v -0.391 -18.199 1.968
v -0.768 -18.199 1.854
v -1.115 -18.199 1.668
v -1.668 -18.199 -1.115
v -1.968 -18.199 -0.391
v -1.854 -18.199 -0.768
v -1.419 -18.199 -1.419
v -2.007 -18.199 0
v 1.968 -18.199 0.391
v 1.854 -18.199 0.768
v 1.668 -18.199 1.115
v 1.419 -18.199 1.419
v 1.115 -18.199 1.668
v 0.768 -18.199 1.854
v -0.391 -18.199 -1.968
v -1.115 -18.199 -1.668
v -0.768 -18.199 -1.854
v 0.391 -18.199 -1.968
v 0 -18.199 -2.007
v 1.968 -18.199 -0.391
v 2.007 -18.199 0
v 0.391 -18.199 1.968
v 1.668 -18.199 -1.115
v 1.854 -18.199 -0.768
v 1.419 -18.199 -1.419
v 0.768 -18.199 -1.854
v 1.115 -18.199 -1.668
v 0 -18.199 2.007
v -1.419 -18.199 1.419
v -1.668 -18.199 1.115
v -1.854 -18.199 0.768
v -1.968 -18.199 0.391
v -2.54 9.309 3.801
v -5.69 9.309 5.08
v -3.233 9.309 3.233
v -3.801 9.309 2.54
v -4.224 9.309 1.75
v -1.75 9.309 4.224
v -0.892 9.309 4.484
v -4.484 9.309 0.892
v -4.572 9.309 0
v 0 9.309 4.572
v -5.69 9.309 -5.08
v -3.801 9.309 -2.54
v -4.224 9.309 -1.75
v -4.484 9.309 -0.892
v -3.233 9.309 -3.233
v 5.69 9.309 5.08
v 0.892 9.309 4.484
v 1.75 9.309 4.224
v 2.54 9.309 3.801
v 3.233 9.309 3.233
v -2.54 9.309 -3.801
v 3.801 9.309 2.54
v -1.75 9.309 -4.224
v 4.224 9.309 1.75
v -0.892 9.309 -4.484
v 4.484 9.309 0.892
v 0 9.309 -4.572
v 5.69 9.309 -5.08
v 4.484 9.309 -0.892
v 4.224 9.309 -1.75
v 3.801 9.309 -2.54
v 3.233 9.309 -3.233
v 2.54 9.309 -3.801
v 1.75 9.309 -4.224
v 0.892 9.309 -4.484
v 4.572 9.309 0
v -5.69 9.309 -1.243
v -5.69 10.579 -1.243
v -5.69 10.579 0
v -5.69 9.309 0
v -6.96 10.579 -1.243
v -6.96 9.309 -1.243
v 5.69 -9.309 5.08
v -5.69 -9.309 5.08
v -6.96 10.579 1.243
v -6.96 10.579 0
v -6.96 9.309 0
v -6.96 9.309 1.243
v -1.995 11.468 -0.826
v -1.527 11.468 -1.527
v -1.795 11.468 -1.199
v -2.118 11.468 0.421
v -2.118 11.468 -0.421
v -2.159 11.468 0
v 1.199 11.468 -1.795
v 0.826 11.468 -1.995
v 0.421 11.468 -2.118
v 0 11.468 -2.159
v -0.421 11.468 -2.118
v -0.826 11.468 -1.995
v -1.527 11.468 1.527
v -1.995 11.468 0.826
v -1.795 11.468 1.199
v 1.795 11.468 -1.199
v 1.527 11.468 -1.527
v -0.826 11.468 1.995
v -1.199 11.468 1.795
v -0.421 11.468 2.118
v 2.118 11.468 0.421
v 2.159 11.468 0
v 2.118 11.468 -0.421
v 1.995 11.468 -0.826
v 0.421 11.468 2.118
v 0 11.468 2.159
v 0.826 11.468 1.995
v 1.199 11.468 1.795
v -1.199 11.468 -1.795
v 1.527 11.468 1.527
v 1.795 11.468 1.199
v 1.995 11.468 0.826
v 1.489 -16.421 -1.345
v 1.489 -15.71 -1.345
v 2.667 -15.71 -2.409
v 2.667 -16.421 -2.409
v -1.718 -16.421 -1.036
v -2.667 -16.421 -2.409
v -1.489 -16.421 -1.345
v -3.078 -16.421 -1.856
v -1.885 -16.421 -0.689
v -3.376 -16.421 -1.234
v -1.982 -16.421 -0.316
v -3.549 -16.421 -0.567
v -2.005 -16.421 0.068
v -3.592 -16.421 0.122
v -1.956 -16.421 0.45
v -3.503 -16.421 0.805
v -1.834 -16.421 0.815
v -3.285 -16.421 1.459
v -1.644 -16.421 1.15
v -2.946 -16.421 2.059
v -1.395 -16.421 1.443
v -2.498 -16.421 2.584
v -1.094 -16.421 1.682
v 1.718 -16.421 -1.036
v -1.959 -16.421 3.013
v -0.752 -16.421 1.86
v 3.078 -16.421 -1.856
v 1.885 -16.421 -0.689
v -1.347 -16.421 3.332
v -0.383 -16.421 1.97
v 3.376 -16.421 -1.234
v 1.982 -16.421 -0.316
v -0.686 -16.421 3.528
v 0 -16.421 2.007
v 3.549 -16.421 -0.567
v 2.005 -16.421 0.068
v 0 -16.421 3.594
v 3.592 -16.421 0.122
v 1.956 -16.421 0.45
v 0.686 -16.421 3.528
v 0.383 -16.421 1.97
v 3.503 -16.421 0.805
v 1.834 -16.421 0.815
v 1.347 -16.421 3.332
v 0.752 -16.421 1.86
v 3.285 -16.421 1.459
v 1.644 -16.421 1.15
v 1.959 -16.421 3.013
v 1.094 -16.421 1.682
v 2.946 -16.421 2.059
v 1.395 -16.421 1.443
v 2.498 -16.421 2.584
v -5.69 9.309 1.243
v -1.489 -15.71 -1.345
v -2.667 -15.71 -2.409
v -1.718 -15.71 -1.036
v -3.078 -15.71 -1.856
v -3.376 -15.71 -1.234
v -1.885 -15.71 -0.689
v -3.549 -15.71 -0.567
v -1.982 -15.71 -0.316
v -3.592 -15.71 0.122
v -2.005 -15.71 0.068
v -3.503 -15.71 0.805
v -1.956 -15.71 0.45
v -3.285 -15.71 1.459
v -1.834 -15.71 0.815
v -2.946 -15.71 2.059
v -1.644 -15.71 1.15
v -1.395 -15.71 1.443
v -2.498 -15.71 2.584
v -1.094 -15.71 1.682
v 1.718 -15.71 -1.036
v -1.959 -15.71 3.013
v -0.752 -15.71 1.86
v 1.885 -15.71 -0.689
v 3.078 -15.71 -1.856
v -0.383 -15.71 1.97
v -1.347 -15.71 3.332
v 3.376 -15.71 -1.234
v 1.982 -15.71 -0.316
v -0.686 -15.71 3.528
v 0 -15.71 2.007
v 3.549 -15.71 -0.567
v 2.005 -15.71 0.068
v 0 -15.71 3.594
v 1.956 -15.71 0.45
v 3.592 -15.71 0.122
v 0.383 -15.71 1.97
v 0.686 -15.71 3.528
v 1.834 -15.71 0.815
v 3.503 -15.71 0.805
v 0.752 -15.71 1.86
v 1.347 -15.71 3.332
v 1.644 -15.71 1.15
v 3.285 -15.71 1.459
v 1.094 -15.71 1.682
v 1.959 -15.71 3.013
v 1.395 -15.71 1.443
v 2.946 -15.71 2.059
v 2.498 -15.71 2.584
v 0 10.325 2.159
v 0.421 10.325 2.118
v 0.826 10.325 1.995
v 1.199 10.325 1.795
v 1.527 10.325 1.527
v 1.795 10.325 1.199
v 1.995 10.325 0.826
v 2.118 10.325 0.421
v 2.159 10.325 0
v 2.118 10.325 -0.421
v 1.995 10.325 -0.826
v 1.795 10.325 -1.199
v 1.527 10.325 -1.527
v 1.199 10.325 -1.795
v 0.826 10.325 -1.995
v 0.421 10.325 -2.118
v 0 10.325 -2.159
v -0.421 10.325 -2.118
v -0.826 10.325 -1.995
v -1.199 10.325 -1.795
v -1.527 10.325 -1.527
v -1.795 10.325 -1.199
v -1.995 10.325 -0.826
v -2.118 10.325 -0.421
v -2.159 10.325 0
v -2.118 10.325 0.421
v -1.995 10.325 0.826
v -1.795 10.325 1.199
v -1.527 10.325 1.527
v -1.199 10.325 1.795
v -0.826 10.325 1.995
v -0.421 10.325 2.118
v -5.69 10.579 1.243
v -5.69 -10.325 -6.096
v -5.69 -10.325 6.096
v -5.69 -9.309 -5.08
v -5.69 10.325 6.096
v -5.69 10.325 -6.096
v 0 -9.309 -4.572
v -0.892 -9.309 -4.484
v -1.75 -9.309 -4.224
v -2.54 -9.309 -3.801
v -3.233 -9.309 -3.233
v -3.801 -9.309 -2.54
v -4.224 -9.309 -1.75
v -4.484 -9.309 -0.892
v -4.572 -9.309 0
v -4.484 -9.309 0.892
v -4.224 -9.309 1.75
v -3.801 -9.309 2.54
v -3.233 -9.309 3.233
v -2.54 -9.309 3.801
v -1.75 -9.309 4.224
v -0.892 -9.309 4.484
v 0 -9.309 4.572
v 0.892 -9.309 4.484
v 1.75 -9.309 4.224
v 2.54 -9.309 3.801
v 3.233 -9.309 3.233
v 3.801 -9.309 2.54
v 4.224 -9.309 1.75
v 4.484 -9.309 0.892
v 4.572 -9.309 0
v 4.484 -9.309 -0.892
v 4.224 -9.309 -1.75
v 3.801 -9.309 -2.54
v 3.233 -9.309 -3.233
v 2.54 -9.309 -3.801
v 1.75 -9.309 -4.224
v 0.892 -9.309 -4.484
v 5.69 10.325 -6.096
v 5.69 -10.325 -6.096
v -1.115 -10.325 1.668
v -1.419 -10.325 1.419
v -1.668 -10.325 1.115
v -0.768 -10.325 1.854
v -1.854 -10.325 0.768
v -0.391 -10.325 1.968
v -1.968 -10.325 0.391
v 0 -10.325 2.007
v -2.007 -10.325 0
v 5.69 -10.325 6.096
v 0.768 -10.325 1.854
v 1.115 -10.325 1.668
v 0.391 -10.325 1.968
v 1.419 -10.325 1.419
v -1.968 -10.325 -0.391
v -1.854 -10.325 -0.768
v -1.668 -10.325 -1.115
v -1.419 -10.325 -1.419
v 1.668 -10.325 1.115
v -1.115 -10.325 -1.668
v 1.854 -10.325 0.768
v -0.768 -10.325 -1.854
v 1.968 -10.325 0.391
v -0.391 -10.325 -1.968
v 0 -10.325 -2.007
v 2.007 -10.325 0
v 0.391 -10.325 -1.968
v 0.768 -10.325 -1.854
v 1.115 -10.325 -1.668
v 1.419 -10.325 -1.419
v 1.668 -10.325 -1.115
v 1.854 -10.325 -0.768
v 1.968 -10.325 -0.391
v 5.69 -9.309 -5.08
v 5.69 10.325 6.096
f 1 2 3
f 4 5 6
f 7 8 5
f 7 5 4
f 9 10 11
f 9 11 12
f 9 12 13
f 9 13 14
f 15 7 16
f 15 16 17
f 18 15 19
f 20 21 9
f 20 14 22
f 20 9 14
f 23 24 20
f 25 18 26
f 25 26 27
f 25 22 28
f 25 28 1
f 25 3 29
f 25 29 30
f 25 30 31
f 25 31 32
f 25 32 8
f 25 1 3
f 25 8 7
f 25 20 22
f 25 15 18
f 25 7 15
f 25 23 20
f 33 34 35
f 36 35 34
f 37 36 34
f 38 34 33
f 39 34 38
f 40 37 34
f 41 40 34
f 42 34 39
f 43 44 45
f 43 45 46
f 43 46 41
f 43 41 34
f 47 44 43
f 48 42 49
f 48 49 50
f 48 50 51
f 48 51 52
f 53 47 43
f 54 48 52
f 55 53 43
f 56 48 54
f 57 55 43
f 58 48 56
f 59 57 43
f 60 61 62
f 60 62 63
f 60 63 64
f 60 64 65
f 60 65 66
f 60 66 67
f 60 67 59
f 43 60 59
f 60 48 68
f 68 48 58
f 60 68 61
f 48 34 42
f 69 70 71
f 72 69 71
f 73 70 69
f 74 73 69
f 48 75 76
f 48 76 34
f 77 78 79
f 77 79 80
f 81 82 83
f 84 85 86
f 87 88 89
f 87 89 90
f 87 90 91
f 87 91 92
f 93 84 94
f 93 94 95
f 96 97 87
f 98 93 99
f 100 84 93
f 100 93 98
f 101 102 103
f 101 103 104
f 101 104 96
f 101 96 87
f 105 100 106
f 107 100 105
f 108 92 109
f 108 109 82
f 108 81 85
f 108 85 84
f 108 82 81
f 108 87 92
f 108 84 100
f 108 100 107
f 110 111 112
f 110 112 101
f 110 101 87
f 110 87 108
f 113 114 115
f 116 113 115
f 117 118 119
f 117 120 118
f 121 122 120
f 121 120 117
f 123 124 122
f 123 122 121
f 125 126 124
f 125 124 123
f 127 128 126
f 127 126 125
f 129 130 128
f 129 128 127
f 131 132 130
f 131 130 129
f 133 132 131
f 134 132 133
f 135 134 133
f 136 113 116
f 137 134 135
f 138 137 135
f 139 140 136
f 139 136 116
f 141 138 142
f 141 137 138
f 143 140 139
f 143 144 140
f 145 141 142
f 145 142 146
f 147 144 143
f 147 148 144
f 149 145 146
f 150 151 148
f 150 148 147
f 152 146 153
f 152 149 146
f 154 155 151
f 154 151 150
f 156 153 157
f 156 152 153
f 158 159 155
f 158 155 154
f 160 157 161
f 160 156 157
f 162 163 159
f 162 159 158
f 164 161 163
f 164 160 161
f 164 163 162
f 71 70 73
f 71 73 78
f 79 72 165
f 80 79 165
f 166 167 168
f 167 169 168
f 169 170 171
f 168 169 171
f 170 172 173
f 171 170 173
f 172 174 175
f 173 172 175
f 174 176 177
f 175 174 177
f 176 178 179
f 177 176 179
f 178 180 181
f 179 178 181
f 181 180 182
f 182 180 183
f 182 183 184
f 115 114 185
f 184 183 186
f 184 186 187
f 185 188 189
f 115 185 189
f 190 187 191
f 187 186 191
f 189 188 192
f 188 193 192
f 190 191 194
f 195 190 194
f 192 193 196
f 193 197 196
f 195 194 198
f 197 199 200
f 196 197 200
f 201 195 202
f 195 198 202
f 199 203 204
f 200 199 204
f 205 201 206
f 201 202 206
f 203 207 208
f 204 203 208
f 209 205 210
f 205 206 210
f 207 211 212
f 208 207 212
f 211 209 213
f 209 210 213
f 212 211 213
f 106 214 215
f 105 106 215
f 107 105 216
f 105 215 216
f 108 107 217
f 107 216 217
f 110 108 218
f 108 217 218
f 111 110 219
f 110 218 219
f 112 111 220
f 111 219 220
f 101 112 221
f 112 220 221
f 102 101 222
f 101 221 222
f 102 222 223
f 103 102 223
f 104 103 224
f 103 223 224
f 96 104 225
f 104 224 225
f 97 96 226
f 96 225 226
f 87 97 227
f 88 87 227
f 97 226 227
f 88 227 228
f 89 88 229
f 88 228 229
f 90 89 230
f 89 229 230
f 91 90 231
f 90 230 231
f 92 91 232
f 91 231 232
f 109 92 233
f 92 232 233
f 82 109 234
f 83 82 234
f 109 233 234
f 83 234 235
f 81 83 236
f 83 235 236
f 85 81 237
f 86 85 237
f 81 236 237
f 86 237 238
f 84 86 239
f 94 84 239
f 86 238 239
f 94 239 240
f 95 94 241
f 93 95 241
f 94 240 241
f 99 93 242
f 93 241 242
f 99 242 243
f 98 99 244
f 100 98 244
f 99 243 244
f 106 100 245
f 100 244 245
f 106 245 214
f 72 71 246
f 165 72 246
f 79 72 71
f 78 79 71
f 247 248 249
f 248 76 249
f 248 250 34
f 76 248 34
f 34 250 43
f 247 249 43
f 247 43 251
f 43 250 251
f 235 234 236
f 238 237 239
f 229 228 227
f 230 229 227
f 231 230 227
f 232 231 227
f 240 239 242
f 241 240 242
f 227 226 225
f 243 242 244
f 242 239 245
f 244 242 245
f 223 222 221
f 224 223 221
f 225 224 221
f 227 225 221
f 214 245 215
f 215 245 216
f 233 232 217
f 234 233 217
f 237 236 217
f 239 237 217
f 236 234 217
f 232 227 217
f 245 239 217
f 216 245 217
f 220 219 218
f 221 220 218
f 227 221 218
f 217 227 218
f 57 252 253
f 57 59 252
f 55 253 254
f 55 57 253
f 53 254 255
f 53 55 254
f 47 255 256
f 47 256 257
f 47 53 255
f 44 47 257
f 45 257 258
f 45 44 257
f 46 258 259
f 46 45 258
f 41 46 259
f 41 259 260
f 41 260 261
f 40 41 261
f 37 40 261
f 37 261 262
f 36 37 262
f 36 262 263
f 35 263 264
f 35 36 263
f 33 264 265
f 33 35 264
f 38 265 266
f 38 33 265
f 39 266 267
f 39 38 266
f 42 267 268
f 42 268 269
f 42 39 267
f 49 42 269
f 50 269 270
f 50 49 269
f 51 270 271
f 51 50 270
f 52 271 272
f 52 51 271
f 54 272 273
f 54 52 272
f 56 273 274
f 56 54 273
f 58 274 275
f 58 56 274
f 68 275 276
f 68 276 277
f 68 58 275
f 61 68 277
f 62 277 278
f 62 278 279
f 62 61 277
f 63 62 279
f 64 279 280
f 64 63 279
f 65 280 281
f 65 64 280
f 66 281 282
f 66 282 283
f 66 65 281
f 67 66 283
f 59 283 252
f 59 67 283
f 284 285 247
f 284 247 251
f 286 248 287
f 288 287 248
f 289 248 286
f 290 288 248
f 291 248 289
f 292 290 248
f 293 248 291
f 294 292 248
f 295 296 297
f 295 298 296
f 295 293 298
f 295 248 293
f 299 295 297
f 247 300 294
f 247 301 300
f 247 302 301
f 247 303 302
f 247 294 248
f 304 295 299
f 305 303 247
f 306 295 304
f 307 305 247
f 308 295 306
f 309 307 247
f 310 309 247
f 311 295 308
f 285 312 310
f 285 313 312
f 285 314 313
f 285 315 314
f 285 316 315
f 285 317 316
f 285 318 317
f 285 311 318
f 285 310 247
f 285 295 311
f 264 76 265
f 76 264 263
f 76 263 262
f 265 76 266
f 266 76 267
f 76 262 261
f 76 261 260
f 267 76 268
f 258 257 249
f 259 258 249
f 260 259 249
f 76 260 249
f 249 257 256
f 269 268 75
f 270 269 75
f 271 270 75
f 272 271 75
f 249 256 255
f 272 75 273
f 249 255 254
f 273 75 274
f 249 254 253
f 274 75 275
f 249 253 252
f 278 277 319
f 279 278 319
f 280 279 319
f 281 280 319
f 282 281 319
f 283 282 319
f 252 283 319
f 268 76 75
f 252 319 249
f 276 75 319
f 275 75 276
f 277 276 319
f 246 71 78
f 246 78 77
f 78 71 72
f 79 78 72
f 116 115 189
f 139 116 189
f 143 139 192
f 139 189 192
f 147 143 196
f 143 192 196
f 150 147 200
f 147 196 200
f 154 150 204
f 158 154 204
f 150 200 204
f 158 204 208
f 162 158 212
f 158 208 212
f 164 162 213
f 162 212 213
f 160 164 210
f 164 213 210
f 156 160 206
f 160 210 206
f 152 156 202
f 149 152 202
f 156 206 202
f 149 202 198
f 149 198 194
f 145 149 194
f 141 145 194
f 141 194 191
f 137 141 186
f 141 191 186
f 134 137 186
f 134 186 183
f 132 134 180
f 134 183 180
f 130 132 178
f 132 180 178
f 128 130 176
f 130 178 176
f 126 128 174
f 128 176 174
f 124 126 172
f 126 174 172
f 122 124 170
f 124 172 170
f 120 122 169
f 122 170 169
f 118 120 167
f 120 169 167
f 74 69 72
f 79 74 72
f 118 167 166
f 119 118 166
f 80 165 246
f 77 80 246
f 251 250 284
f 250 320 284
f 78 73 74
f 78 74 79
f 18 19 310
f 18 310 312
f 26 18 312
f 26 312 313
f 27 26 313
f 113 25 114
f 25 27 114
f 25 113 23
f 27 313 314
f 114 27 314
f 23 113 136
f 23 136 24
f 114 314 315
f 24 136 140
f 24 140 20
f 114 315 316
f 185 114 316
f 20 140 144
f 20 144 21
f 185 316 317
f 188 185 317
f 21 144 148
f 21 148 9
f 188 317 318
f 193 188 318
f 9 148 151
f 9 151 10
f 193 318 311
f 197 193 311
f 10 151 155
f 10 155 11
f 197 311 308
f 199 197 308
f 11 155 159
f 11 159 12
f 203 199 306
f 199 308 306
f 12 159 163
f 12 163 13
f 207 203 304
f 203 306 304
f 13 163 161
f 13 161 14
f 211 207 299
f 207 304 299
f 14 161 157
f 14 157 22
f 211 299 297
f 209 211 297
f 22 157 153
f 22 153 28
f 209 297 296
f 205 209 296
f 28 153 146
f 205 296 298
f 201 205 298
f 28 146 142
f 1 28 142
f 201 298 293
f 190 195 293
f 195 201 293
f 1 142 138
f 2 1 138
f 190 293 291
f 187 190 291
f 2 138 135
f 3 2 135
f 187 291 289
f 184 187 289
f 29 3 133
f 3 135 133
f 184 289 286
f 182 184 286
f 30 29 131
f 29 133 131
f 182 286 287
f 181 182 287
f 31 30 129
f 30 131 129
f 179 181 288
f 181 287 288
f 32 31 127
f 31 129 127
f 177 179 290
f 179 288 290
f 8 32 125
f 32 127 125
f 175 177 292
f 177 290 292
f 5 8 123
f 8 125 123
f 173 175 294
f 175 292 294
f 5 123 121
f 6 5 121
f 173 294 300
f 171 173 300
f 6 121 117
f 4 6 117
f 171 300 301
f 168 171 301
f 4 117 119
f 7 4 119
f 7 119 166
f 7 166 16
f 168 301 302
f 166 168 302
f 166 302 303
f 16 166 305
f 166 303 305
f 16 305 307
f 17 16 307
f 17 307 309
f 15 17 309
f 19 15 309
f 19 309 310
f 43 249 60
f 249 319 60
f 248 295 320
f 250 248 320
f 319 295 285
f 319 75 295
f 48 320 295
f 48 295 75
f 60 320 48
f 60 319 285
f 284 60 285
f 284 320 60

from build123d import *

# Parameters (mm, degrees)
SKETCH3_W            = 12.192
SKETCH3_H            = 20.6502
SKETCH3_W_2          = 10.16
SKETCH3_H_2          = 18.6182
BOSS_EXTRUDE3_DEPTH  = 5.6896
SKETCH2_R            = 4.572
BOSS_EXTRUDE2_DEPTH  = 9.398
SKETCH4_R            = 2.159
BOSS_EXTRUDE4_DEPTH  = 1.143
SKETCH5_R            = 2.0066
BOSS_EXTRUDE5_DEPTH  = 7.874
BOSS_EXTRUDE11_DEPTH = 0.7112
SKETCH7_W            = 1.242870129
SKETCH7_H            = 1.27
BOSS_EXTRUDE12_DEPTH = 1.27
SKETCH7_3_W          = 1.242870129
SKETCH7_3_H          = 1.27
BOSS_EXTRUDE13_DEPTH = 1.27


with BuildPart() as part:
    # Sketch3 → Boss-Extrude3 (new, symmetric)
    with BuildSketch(Plane(origin=(0, 0, 0), x_dir=(0, 0, -1), z_dir=(1, 0, 0))):
        Rectangle(SKETCH3_W, SKETCH3_H)
        Rectangle(SKETCH3_W_2, SKETCH3_H_2, mode=Mode.SUBTRACT)
    extrude(amount=BOSS_EXTRUDE3_DEPTH, both=True)

    # Sketch2 → Boss-Extrude2 (add, symmetric)
    with BuildSketch(Plane(origin=(0, 0, 0), x_dir=(1, 0, 0), z_dir=(0, 1, 0))):
        Circle(SKETCH2_R)
    extrude(amount=BOSS_EXTRUDE2_DEPTH, both=True)

    # Sketch5 → Boss-Extrude5 (add)
    with BuildSketch(Plane.XZ.offset(10.3251)):
        Circle(SKETCH5_R)
    extrude(amount=BOSS_EXTRUDE5_DEPTH)

    # Sketch6 → Boss-Extrude11 (add)
    with BuildSketch(Plane.XZ.offset(15.7099)):
        with BuildLine():
            Line((-2.667, -2.409287407), (-1.488996466, -1.345114524))
            ThreePointArc((-1.488996466, -1.345114524), (0, 2.0066), (1.488996466, -1.345114524))
            Line((1.488996466, -1.345114524), (2.667, -2.409287407))
            ThreePointArc((2.667, -2.409287407), (0, 3.5941), (-2.667, -2.409287407))
        make_face()
    extrude(amount=BOSS_EXTRUDE11_DEPTH)


with BuildPart() as body_2:
    # Sketch4 → Boss-Extrude4 (new body)
    with BuildSketch(Plane(origin=(0, 10.3251, 0), x_dir=(1, 0, 0), z_dir=(0, 1, 0))):
        Circle(SKETCH4_R)
    extrude(amount=BOSS_EXTRUDE4_DEPTH)


with BuildPart() as body_3:
    # Sketch7 → Boss-Extrude12 (new body)
    with BuildSketch(Plane.ZY.offset(5.6896)):
        with Locations((-0.621435065, 9.9441)):
            Rectangle(SKETCH7_W, SKETCH7_H)
    extrude(amount=BOSS_EXTRUDE12_DEPTH)


with BuildPart() as body_4:
    # Sketch7<3> → Boss-Extrude13 (new body)
    with BuildSketch(Plane.ZY.offset(5.6896)):
        with Locations((0.621435065, 9.9441)):
            Rectangle(SKETCH7_3_W, SKETCH7_3_H)
    extrude(amount=BOSS_EXTRUDE13_DEPTH)


solid = Compound([part.part, body_2.part, body_3.part, body_4.part])
